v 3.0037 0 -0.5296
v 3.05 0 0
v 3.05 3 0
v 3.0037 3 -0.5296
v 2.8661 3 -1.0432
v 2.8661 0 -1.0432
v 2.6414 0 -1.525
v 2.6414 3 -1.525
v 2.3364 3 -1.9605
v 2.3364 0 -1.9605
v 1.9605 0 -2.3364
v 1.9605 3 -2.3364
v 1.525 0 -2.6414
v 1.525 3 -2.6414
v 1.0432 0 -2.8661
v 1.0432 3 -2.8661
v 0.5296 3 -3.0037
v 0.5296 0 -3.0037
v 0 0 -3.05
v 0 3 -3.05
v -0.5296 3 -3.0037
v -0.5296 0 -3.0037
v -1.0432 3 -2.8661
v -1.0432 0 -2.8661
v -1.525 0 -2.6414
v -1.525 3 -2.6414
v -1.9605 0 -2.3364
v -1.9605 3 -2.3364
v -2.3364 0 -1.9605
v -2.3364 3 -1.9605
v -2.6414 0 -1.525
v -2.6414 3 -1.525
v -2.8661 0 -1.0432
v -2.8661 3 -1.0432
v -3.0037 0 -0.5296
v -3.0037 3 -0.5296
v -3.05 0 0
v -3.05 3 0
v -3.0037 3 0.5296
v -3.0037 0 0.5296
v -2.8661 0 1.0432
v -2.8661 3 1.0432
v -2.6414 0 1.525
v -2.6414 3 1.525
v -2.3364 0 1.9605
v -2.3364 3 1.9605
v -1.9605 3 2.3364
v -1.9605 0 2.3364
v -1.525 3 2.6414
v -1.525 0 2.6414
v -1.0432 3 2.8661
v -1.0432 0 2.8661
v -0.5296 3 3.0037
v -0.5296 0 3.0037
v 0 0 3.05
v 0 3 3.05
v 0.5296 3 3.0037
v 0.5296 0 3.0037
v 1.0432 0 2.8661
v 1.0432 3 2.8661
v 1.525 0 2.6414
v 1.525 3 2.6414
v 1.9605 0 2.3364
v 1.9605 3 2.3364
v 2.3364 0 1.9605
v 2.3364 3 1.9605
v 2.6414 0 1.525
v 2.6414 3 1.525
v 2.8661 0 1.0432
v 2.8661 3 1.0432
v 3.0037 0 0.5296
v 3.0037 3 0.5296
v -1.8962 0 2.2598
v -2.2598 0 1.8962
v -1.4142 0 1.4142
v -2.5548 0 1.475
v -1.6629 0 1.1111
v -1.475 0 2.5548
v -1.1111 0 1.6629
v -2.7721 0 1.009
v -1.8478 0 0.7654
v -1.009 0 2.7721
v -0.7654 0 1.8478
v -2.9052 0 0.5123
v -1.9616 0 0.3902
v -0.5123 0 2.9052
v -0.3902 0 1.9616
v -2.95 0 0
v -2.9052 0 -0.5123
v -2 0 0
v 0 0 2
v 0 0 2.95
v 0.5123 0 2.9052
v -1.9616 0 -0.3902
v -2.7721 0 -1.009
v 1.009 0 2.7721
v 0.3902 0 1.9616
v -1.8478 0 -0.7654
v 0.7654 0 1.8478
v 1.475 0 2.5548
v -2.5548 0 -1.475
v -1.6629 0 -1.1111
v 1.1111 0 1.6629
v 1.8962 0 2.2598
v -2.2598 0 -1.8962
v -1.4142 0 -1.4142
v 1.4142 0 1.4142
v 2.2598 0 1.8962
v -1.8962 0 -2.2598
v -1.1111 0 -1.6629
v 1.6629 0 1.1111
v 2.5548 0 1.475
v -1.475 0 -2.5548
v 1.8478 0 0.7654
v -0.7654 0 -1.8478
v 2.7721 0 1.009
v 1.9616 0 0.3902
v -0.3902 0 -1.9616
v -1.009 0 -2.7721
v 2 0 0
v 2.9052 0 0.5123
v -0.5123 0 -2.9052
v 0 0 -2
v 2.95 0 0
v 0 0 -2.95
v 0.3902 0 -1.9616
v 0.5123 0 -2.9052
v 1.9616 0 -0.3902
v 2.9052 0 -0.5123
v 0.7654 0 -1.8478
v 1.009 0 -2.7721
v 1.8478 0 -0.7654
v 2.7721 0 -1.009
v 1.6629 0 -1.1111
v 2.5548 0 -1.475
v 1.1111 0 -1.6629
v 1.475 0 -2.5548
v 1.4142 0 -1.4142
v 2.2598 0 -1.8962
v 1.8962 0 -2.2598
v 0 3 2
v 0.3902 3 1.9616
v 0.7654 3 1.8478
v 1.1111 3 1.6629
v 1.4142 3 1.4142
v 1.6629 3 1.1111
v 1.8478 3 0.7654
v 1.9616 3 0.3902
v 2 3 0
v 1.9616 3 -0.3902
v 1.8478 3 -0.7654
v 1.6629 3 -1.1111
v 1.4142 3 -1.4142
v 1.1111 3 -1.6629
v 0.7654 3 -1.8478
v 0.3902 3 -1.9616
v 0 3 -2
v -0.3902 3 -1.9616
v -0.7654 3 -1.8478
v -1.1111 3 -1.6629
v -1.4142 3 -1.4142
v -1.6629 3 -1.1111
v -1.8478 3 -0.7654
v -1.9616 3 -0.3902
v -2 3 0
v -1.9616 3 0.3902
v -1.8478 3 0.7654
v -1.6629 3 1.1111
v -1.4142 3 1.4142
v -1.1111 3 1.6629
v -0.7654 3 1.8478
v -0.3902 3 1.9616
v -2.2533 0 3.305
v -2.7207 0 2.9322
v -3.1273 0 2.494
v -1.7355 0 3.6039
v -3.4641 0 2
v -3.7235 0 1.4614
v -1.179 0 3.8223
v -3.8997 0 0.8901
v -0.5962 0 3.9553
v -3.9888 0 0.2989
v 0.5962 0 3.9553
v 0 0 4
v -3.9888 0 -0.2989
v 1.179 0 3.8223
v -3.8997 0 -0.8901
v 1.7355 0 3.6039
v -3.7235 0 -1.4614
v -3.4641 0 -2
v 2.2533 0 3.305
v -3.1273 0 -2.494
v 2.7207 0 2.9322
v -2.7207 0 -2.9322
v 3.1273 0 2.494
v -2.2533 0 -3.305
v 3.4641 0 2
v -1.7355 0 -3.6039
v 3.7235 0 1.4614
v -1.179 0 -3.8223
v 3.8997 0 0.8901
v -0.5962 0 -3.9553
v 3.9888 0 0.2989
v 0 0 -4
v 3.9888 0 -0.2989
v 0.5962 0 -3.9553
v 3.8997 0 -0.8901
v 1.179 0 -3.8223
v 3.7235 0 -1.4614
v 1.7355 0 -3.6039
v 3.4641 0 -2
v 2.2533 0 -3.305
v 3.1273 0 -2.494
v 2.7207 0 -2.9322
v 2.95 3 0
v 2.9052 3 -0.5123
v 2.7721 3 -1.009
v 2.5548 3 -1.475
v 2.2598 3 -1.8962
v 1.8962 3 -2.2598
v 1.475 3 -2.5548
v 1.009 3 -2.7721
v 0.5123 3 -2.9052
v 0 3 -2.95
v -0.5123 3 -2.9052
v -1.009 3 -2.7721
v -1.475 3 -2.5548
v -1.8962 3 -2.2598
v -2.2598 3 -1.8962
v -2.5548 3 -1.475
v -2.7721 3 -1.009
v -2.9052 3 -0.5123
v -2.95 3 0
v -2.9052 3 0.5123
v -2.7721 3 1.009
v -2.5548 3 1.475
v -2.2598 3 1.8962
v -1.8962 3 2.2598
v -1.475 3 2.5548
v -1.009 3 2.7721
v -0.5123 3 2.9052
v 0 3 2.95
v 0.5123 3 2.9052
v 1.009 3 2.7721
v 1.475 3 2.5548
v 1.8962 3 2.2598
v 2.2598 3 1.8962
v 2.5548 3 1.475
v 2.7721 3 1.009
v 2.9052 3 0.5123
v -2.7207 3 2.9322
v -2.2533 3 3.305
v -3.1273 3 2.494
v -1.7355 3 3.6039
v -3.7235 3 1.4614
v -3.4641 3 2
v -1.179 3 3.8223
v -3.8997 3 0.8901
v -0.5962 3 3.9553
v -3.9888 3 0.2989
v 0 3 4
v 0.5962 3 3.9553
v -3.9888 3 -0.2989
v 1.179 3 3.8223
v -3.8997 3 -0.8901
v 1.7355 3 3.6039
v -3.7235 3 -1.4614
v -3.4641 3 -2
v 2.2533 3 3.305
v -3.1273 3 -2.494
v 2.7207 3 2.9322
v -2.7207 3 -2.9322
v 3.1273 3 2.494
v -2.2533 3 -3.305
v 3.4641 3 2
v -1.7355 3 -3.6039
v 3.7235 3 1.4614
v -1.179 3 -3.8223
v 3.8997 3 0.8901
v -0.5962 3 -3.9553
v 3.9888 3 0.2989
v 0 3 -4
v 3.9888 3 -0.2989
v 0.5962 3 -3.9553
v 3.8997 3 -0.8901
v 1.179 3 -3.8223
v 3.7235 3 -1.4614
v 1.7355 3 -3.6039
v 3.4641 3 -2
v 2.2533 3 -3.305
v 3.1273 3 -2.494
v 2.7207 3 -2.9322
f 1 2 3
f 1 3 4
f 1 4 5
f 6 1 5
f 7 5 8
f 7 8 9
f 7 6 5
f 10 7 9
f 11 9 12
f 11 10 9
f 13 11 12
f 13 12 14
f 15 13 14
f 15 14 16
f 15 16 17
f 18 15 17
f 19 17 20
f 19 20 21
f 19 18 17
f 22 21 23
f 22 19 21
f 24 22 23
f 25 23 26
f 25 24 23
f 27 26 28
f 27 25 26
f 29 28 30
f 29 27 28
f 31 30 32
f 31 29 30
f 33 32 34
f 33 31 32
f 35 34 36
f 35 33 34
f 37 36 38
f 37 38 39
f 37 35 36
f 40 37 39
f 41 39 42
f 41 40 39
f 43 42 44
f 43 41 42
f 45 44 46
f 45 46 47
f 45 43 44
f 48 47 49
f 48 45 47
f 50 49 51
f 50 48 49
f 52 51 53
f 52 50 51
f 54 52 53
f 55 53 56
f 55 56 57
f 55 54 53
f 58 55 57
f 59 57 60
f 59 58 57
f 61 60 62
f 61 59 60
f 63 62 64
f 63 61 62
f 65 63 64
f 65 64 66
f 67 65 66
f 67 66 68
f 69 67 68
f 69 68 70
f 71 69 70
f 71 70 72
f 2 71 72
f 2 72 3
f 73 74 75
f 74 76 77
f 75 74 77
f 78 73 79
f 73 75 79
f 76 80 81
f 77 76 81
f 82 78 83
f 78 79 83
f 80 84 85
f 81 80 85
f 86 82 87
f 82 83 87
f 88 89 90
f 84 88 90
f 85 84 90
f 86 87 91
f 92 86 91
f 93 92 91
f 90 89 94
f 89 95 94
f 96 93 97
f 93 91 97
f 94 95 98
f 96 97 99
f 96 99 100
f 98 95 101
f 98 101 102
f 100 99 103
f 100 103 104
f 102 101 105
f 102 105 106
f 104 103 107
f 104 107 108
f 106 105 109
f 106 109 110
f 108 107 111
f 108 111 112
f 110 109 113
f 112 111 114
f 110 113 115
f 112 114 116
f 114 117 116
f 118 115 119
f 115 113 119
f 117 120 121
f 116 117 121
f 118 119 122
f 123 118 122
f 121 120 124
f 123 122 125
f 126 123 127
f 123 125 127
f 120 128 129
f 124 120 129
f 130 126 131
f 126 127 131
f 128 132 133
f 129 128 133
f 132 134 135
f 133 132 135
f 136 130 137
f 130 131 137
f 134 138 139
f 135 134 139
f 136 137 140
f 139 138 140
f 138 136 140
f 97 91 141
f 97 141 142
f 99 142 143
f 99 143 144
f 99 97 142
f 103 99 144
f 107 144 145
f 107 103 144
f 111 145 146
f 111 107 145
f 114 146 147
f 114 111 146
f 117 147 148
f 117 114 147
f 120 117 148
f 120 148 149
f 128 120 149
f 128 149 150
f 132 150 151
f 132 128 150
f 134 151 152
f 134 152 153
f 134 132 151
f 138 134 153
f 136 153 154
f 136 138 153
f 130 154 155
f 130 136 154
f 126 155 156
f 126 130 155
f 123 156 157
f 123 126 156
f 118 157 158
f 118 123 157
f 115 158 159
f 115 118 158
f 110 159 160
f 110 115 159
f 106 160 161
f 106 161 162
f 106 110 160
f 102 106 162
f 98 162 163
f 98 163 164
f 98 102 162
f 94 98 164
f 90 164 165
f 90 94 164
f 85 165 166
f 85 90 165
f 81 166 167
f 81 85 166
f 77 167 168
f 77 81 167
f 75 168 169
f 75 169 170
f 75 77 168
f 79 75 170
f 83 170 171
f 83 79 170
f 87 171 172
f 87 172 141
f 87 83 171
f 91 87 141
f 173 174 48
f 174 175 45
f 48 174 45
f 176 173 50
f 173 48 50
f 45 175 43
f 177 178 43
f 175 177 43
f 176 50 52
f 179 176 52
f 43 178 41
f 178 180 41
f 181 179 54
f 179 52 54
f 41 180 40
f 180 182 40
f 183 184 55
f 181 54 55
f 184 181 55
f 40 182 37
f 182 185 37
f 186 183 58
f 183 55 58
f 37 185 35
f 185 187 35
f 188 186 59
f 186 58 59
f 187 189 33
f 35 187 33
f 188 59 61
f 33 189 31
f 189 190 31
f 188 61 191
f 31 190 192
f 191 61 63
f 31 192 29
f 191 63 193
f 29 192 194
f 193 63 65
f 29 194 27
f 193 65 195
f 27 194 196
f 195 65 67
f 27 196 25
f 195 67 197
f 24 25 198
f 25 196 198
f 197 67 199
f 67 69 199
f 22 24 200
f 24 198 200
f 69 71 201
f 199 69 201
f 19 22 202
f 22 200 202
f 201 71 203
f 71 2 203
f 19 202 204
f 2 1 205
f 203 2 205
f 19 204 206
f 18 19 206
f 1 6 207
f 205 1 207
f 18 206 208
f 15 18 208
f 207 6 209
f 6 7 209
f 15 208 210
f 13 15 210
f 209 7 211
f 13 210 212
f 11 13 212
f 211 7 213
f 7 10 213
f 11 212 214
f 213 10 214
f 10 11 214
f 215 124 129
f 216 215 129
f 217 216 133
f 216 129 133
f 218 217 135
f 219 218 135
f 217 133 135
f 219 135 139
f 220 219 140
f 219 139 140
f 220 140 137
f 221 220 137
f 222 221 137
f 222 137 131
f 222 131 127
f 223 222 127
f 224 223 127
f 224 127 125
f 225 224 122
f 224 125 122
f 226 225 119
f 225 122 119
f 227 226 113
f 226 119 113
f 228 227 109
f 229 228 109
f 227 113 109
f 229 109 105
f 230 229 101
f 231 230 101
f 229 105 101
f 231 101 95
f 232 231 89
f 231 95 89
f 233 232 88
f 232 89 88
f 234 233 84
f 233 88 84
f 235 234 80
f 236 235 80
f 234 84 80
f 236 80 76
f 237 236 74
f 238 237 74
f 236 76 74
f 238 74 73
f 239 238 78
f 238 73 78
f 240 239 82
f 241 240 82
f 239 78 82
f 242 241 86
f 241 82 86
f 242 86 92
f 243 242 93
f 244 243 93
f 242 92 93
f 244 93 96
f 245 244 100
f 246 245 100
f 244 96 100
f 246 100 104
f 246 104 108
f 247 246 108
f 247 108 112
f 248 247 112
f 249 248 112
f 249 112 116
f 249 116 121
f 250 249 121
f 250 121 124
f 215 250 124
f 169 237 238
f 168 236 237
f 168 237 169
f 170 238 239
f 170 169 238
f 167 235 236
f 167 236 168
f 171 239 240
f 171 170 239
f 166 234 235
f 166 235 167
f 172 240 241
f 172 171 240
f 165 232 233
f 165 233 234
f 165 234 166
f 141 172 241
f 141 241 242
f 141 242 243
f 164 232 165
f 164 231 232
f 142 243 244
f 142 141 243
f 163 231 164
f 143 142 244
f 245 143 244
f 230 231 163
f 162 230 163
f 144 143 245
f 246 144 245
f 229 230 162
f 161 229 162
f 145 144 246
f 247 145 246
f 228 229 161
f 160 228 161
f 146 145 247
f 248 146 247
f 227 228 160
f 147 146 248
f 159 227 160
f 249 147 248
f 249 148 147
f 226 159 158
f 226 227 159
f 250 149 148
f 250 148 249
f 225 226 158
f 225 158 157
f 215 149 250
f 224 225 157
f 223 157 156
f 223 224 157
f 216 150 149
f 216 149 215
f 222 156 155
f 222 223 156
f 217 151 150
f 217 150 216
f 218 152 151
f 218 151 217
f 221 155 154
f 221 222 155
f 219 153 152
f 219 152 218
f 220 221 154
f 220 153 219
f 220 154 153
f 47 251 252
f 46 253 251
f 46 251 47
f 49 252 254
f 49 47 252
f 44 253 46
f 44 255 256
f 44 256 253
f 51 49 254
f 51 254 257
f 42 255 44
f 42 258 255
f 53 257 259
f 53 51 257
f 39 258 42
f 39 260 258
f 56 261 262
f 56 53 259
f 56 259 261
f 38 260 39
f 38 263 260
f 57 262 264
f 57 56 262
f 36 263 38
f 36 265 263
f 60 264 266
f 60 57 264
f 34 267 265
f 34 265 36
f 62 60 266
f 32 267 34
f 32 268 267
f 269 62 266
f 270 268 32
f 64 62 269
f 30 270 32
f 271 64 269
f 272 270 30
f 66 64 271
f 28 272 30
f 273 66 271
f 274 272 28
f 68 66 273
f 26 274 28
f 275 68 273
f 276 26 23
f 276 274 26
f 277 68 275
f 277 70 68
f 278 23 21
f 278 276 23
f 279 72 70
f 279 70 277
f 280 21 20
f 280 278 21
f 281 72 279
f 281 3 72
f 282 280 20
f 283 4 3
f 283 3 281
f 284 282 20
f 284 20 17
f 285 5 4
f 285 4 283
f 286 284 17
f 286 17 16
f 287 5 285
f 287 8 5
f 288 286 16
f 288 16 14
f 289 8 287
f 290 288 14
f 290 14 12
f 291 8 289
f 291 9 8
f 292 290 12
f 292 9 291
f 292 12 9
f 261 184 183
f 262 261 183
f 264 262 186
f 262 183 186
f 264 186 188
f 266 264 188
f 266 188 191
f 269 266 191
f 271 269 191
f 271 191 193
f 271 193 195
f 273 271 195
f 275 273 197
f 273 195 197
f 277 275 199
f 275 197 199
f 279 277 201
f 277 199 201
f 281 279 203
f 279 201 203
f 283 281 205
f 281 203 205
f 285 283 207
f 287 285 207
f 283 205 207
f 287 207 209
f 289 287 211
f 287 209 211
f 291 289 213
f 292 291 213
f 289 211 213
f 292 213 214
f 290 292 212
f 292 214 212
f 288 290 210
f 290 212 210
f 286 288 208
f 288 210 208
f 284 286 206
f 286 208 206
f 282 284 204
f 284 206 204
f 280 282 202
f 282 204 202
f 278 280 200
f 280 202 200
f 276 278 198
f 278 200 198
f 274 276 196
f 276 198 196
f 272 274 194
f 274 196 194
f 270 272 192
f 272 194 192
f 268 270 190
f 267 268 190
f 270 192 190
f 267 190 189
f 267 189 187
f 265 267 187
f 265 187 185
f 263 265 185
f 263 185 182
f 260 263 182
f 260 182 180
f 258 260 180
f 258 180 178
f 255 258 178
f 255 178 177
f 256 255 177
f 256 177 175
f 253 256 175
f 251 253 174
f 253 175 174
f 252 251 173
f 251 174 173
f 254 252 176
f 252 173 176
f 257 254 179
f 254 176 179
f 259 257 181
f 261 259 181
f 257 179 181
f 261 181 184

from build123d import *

# Parameters (mm, degrees)
SKETCH_1_R          = 4
SKETCH_1_R_2        = 3
EXTRUDE_1_DEPTH     = 3
SKETCH_1_3_R        = 3
SKETCH_1_3_R_2      = 2
EXTRUDE_2_DEPTH     = 3
SKETCH_1_5_R        = 3.05
SKETCH_1_5_R_2      = 2.95
CUT_EXTRUDE_2_DEPTH = 3


with BuildPart() as part:
    # 草图1 → 凸台-拉伸1 (new body)
    with BuildSketch(Plane(origin=(0, 0, 0), x_dir=(1, 0, 0), z_dir=(0, 1, 0))):
        Circle(SKETCH_1_R)
        Circle(SKETCH_1_R_2, mode=Mode.SUBTRACT)
    extrude(amount=EXTRUDE_1_DEPTH)

    # 草图1<3> → 凸台-拉伸2 (add)
    with BuildSketch(Plane(origin=(0, 0, 0), x_dir=(1, 0, 0), z_dir=(0, 1, 0))):
        Circle(SKETCH_1_3_R)
        Circle(SKETCH_1_3_R_2, mode=Mode.SUBTRACT)
    extrude(amount=EXTRUDE_2_DEPTH)

    # 草图1<5> → 切除-拉伸-薄壁2 (cut)
    with BuildSketch(Plane(origin=(0, 0, 0), x_dir=(1, 0, 0), z_dir=(0, 1, 0))):
        Circle(SKETCH_1_5_R)
        Circle(SKETCH_1_5_R_2, mode=Mode.SUBTRACT)
    extrude(amount=CUT_EXTRUDE_2_DEPTH, mode=Mode.SUBTRACT)


with BuildPart() as cut_extrude_2_piece_1:
    # of the separate pieces the step leaves, piece 1, a body of its own (cut_extrude_2_pieces)
    add(part.part.solids().sort_by_distance((4, 0, 0))[0])


with BuildPart() as cut_extrude_2_piece_2:
    # of the separate pieces the step leaves, piece 2, a body of its own (cut_extrude_2_pieces)
    add(part.part.solids().sort_by_distance((2.95, 0, 0))[0])


solid = Compound([cut_extrude_2_piece_1.part, cut_extrude_2_piece_2.part])
